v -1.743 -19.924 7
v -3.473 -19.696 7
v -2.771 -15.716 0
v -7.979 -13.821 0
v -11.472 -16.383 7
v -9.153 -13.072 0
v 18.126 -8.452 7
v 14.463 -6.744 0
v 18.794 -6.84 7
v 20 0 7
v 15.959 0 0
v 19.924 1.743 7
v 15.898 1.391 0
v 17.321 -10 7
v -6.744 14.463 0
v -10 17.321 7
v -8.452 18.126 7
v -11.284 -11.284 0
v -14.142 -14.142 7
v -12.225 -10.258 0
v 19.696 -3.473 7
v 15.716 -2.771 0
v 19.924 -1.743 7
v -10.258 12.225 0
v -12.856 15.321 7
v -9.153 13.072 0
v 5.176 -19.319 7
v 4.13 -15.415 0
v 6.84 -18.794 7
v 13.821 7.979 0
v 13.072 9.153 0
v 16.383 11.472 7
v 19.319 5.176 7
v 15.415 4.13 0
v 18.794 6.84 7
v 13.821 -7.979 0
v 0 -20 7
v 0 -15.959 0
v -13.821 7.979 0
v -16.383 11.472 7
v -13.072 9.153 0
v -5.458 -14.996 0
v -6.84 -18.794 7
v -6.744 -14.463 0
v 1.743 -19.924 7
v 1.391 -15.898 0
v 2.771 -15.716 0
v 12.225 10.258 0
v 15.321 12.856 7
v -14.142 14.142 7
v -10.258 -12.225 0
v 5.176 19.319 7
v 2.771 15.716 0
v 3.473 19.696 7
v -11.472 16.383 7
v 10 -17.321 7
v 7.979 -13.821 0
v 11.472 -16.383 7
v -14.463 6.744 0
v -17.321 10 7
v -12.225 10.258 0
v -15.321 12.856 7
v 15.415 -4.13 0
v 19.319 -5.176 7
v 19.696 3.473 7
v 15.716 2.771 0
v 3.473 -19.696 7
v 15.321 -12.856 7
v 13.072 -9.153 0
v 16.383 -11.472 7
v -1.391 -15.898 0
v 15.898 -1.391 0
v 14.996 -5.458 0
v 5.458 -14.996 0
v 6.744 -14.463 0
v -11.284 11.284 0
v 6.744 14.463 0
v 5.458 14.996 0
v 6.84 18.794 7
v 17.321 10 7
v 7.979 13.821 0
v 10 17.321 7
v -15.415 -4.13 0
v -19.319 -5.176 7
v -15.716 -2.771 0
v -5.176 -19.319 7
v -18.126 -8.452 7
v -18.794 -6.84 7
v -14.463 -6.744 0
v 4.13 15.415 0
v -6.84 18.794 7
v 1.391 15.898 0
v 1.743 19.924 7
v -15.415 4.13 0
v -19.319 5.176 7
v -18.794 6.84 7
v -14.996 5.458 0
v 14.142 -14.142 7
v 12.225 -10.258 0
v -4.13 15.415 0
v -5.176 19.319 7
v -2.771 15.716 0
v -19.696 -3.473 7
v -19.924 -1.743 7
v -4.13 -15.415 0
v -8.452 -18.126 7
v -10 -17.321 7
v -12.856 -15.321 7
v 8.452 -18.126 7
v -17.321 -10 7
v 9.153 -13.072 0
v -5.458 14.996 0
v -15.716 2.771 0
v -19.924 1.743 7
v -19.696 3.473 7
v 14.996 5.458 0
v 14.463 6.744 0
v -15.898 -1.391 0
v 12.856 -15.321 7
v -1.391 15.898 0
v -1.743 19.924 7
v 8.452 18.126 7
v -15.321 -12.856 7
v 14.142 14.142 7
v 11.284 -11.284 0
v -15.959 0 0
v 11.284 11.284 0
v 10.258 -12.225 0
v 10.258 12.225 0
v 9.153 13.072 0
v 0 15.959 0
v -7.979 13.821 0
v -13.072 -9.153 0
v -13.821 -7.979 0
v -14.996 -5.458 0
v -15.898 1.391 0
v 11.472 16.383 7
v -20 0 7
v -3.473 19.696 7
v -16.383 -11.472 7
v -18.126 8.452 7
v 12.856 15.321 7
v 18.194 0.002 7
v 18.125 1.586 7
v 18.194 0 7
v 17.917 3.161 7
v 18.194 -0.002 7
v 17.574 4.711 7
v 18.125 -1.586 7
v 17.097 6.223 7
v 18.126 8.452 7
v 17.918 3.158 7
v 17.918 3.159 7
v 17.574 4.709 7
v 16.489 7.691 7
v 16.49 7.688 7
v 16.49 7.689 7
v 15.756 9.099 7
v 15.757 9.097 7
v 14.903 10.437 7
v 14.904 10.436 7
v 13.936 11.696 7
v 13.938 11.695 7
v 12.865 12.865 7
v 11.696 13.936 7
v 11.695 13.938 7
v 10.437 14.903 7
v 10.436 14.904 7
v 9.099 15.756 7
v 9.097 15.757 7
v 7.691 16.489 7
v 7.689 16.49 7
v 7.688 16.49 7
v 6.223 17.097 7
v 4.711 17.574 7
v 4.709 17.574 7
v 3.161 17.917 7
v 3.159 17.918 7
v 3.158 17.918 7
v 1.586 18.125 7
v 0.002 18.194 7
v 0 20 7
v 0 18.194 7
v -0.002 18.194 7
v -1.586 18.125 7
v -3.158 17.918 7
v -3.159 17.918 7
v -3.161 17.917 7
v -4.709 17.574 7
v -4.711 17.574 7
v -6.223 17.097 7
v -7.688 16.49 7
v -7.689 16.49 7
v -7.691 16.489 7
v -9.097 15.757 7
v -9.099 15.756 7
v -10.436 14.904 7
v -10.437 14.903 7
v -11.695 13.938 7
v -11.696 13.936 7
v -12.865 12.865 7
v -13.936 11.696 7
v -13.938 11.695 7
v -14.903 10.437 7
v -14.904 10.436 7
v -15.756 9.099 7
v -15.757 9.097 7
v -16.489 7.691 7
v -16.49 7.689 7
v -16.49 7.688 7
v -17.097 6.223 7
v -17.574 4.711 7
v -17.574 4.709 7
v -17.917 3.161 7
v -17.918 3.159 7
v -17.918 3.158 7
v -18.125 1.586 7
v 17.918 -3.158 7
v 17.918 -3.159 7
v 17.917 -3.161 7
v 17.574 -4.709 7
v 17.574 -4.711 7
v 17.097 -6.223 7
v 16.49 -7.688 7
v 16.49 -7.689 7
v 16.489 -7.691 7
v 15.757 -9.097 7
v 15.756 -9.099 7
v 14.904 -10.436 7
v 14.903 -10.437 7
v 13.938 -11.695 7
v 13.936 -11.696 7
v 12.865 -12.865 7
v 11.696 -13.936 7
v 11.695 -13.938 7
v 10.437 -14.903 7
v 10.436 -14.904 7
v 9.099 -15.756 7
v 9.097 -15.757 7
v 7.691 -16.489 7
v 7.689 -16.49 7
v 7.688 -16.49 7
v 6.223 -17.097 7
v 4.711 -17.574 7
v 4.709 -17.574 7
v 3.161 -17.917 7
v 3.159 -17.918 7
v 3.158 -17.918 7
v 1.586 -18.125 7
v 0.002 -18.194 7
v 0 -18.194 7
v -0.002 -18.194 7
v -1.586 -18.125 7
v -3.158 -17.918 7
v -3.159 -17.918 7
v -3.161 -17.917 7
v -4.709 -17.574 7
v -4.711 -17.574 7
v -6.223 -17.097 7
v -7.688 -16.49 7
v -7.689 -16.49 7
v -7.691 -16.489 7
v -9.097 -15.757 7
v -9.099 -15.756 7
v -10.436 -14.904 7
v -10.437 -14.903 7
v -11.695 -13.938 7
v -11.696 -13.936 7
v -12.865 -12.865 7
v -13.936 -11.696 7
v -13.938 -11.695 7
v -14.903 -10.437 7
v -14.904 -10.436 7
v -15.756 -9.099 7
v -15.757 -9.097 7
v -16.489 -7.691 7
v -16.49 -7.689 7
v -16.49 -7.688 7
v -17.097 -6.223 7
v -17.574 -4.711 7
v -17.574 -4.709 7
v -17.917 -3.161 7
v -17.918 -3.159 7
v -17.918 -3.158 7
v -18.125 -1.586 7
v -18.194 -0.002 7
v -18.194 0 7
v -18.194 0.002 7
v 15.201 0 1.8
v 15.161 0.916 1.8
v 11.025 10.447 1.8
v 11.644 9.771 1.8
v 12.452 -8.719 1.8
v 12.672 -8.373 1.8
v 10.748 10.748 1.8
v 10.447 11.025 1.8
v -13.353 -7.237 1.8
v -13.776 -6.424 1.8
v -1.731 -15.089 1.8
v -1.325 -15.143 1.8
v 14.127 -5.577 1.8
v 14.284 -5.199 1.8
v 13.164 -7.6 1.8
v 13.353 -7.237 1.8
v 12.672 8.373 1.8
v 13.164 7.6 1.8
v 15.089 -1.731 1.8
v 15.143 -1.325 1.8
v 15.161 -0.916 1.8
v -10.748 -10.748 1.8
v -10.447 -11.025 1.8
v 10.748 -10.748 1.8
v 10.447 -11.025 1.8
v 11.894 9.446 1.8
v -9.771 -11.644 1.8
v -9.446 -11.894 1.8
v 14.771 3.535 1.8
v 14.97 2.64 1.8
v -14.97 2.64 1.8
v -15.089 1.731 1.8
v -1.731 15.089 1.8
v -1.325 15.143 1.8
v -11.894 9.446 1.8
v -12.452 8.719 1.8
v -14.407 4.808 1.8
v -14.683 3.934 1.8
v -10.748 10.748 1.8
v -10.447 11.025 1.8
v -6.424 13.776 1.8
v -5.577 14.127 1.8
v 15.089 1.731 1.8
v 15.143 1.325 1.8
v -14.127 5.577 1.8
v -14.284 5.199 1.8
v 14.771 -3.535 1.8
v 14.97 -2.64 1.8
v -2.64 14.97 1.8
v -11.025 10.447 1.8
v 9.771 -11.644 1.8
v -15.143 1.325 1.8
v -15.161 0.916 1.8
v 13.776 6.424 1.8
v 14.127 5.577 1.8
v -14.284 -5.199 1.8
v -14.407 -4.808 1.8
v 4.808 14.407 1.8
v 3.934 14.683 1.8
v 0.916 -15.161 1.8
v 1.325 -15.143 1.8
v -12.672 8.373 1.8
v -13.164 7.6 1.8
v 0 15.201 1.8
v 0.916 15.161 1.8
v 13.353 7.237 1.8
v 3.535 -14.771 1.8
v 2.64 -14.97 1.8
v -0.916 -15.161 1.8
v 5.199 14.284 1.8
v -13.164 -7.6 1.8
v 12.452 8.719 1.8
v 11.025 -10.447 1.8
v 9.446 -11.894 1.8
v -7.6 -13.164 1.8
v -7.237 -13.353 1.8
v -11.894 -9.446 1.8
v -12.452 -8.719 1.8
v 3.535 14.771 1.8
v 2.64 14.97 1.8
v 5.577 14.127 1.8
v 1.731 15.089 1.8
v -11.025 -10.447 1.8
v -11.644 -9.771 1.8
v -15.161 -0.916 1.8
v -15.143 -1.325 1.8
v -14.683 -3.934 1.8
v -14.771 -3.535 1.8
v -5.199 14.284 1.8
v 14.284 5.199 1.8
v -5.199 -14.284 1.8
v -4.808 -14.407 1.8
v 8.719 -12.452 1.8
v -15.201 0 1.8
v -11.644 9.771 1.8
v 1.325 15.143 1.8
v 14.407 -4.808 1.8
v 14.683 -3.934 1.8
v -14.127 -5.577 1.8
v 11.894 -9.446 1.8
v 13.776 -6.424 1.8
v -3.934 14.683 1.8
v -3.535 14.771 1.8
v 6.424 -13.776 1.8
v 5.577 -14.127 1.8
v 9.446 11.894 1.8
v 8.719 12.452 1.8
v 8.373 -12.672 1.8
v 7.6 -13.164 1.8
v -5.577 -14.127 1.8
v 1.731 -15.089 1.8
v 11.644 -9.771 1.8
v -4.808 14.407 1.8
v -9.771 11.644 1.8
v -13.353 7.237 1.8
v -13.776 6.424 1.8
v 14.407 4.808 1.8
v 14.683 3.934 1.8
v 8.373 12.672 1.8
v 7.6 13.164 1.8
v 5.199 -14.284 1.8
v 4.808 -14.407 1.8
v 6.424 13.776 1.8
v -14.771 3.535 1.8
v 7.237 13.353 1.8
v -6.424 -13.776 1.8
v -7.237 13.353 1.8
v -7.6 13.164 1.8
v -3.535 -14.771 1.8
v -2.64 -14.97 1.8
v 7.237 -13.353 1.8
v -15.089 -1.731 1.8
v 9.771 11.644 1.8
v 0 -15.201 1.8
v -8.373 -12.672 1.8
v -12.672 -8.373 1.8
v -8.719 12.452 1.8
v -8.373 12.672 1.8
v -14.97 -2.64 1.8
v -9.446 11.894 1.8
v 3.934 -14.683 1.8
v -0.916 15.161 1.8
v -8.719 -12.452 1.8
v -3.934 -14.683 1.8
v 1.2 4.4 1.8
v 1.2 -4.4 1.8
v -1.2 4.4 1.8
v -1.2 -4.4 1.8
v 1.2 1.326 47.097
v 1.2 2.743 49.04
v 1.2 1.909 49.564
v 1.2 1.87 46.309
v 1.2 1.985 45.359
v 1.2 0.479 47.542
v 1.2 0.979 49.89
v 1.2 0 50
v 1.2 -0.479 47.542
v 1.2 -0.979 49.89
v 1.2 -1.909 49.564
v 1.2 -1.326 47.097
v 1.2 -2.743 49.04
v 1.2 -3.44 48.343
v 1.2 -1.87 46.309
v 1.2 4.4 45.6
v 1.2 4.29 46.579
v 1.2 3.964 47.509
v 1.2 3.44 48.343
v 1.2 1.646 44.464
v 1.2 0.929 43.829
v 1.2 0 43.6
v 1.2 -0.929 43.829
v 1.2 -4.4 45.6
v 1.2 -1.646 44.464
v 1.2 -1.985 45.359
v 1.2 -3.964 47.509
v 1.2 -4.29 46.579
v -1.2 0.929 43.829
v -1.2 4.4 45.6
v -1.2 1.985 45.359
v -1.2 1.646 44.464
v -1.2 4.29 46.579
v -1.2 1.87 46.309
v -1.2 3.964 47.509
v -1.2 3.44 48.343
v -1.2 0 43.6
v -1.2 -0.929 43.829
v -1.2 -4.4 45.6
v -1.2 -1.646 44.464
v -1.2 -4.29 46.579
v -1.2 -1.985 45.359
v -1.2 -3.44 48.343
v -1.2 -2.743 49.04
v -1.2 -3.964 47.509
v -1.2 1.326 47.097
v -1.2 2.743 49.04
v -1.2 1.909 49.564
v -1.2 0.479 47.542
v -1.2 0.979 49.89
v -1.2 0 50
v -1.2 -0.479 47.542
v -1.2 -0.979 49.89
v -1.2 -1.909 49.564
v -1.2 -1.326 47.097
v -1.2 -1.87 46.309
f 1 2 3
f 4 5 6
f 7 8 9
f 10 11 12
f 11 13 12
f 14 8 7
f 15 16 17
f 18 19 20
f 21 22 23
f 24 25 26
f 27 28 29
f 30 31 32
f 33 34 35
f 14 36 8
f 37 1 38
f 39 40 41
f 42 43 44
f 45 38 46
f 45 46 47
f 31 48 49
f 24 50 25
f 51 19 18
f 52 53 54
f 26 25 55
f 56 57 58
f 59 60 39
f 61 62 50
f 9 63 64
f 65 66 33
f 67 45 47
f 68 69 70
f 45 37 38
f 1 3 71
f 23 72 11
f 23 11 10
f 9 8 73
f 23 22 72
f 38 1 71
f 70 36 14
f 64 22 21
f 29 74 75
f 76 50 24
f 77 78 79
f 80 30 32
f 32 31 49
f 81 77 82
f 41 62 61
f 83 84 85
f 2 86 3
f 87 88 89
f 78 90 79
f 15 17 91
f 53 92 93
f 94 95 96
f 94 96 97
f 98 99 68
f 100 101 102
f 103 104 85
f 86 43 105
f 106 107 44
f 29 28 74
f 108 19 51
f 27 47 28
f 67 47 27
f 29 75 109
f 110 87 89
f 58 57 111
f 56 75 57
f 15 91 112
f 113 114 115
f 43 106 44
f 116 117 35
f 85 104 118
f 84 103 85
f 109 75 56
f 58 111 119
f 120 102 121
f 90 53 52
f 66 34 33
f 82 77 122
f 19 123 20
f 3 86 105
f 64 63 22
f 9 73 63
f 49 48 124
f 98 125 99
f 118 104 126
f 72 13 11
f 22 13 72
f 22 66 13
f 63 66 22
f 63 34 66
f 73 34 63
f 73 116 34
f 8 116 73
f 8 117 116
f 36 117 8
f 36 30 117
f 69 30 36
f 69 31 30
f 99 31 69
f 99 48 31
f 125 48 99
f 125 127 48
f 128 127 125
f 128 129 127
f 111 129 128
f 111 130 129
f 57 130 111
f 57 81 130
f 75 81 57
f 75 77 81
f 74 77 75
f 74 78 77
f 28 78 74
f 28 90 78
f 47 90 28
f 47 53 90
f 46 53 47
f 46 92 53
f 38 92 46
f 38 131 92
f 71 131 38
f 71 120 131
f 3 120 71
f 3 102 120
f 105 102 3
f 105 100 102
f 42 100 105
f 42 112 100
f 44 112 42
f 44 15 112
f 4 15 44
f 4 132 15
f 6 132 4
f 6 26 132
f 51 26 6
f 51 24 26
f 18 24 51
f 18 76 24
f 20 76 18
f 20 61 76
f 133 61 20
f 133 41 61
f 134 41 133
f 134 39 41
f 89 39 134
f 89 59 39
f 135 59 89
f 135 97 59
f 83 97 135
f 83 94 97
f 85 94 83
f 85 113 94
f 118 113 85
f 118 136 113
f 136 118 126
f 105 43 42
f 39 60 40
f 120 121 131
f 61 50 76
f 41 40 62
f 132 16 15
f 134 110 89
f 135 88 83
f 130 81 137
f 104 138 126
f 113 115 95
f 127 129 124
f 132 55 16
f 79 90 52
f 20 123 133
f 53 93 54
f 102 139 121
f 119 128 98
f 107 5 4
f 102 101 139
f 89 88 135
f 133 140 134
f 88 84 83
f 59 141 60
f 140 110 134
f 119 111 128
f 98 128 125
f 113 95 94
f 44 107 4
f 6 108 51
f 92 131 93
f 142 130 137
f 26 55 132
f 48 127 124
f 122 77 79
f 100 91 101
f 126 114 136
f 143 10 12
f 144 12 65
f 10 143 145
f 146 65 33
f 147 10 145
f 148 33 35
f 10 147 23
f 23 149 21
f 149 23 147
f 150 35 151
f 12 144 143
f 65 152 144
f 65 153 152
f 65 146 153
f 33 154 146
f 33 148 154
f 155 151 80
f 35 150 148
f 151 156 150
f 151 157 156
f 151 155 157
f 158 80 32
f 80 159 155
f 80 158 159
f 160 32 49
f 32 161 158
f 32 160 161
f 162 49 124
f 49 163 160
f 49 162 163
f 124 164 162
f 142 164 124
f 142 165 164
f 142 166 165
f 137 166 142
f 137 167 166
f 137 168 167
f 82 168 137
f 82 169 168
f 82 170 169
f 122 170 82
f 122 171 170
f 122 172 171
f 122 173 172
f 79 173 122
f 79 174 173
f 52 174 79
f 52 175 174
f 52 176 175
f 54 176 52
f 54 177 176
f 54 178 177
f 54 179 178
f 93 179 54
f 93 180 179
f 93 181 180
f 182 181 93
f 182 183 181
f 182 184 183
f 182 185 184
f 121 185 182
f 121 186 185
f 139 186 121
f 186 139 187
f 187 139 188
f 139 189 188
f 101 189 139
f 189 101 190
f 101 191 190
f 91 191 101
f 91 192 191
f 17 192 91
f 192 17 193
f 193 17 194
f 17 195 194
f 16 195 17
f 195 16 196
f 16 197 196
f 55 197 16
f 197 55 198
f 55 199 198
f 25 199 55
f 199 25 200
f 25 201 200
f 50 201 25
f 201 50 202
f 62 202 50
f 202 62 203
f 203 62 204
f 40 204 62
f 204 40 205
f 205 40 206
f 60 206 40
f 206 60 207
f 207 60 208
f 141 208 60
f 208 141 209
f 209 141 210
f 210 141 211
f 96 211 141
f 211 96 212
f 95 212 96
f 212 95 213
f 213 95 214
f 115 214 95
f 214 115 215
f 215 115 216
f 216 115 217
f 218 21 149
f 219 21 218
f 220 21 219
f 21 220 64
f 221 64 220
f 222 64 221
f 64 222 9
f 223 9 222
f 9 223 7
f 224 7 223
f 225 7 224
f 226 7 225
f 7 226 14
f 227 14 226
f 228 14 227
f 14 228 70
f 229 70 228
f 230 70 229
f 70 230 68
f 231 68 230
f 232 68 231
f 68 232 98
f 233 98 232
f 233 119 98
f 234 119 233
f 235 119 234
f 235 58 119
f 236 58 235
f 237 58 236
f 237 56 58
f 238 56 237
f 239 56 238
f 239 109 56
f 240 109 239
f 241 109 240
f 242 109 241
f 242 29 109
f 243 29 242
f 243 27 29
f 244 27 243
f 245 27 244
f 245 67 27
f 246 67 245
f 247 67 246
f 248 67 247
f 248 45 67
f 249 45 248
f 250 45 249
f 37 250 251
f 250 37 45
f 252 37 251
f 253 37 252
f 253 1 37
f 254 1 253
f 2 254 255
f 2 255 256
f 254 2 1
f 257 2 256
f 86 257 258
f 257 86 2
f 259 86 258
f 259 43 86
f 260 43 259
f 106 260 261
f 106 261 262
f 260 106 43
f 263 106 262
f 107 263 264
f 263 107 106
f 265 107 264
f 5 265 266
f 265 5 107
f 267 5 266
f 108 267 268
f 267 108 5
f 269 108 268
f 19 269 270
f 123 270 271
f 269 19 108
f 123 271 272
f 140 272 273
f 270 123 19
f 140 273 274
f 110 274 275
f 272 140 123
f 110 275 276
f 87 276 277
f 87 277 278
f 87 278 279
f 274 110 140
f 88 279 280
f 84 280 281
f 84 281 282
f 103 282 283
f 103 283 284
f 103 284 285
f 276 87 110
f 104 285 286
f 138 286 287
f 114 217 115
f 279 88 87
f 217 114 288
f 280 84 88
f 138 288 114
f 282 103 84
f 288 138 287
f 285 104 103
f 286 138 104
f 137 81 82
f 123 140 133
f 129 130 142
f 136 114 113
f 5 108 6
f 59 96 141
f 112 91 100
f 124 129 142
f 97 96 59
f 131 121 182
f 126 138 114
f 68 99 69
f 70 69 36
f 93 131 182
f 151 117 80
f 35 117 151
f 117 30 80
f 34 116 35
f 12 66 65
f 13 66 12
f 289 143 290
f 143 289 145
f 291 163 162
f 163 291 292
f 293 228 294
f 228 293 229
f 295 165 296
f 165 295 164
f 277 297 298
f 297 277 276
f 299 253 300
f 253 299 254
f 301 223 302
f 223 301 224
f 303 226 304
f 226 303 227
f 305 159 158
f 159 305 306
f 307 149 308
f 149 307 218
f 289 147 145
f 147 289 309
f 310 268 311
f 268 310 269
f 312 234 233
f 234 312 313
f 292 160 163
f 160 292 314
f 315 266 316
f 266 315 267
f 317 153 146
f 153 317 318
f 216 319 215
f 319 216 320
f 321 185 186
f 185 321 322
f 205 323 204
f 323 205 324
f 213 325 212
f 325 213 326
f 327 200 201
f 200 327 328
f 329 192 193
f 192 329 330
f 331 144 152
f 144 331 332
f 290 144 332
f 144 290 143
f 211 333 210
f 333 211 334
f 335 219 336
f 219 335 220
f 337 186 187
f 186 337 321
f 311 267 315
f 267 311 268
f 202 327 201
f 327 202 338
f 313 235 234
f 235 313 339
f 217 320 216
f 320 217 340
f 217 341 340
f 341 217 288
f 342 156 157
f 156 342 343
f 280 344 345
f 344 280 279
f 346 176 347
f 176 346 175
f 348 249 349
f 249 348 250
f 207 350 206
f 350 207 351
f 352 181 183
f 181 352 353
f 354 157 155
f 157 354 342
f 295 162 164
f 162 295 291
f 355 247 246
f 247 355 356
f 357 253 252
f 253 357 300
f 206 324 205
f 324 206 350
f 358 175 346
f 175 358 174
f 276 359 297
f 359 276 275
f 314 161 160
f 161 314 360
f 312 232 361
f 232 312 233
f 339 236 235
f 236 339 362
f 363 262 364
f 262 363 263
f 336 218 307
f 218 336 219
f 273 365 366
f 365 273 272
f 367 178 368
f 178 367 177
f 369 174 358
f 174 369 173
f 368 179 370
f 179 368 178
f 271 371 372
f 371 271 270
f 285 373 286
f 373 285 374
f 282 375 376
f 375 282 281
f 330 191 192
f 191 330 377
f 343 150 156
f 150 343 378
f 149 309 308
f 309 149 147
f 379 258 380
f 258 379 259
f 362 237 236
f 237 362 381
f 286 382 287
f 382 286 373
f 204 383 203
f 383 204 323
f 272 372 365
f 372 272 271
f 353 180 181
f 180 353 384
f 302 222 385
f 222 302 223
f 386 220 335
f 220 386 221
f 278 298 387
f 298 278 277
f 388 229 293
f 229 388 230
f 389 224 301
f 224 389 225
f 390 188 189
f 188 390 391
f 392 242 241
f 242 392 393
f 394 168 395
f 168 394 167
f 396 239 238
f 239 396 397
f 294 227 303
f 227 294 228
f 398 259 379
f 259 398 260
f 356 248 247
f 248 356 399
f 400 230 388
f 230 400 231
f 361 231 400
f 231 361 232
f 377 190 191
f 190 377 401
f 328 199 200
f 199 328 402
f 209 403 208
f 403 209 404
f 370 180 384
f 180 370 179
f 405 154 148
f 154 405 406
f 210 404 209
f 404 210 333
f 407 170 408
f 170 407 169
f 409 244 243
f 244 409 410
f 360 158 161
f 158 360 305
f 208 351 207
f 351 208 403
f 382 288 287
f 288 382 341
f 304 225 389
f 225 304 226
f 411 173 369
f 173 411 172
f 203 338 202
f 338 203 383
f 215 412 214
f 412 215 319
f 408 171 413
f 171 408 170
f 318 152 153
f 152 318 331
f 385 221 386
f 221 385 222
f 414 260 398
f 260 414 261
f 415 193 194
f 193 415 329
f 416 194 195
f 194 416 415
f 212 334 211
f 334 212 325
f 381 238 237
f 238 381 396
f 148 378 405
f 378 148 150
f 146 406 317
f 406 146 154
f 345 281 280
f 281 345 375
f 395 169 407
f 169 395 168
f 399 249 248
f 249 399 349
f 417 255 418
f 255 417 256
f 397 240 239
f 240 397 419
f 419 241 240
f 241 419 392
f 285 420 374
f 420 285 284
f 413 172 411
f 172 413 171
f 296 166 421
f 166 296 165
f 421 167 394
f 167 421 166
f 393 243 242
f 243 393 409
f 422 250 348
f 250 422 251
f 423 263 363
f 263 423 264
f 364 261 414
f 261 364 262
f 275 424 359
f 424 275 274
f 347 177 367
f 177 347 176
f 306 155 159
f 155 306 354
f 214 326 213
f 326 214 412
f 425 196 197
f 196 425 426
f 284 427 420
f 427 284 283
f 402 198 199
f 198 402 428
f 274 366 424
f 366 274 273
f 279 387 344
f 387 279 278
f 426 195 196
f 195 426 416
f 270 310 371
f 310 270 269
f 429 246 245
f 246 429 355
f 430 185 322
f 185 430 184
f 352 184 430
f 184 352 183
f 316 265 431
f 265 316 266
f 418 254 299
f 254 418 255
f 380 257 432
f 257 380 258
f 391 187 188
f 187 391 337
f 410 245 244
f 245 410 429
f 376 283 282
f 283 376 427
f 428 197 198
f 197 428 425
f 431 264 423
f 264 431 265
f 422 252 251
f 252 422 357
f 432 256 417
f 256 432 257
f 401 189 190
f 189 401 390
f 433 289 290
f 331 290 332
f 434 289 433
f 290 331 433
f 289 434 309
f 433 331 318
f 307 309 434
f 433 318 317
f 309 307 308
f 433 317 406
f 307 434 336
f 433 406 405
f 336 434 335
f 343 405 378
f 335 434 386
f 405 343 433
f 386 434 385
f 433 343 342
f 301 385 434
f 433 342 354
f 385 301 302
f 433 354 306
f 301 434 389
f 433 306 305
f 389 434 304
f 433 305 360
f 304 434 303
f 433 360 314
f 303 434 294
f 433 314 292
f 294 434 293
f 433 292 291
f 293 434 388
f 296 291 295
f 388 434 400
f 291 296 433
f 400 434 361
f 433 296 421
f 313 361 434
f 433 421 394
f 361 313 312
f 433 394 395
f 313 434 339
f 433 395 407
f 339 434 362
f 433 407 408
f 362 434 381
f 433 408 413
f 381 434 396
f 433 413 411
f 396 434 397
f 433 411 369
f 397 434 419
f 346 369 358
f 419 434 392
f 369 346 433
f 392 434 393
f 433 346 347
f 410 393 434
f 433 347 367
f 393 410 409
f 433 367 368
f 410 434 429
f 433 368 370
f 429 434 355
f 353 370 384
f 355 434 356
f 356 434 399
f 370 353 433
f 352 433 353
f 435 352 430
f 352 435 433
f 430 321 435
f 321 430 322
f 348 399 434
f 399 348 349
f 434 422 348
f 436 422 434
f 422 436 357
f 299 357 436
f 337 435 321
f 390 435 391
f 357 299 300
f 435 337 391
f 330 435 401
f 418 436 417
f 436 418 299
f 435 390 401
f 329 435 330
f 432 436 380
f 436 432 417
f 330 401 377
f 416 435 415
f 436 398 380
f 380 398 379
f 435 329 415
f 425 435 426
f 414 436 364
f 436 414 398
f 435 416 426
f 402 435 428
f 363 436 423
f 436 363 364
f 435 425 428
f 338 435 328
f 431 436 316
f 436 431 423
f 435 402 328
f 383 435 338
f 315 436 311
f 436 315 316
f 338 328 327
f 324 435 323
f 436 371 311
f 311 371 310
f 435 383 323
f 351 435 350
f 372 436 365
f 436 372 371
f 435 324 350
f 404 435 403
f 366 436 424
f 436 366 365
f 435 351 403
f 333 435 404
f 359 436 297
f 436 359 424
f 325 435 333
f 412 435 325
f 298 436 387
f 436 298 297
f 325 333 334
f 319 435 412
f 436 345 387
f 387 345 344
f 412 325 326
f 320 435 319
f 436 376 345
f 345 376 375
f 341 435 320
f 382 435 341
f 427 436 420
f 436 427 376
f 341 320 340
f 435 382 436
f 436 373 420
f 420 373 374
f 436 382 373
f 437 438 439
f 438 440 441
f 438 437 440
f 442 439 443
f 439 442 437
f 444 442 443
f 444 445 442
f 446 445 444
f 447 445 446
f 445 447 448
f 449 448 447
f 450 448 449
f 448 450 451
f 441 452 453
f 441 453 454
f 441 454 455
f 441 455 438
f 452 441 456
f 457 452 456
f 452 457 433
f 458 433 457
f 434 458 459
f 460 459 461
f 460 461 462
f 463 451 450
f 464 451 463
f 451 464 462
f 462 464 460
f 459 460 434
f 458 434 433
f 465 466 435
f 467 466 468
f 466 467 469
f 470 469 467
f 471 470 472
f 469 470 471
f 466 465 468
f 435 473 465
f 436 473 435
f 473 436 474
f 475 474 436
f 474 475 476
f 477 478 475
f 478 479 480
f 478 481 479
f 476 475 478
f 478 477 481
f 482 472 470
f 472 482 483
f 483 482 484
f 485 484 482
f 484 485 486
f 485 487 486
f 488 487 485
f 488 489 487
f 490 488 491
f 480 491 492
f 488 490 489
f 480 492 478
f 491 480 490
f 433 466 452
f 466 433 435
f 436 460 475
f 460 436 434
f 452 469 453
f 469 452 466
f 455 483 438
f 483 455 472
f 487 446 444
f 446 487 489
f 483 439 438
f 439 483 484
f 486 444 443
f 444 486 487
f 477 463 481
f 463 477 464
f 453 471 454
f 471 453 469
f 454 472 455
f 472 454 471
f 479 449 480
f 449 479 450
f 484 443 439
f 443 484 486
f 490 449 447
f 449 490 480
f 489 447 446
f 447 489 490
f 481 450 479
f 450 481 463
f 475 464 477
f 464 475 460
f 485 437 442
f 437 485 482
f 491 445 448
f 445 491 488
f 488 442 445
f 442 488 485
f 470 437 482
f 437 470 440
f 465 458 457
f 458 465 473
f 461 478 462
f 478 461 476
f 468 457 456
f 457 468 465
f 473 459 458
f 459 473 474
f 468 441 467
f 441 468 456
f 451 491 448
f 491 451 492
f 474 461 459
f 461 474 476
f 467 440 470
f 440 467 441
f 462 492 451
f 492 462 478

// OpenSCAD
// -*- mode: SCAD ; c-file-style: "ellemtel" ; coding: utf-8 -*-
//
// simple, functional small mushroom anchor
//
// © 2018 Roland Sieker <ospalh@gmail.com>
// Licence: CC-BY-SA 4.0

// Radius of the cap in millimetres
r = 20;  // [5:1:50]

// size of the “chain” hole
hl = 4;  // [1:0.5:10]

// Set this to “render” and click on “Create Thing” when done with the setup.
preview = 1; // [0:render, 1:preview]



/* [Hidden] */

// Done with the customizer

// *******************************************************
// Extra parameters. These can be changed reasonably safely.

l_to_r = 2.5;  // Length of the stem in rs
r_to_h = 0.35;

w = 2.4;  // Wall width
p = 1.8; // cap width
c = 0.4;  // Clearance
angle = 60; // Overhangs much below 60° are a problem for me

// *******************************************************
// Some shortcuts. These shouldn’t be changed

tau = 2 * PI;  // π is still wrong. τ = circumference ÷ r

xy_factor = 1/tan(angle);
// To get from a height to a horizontal width inclined correctly
z_factor = tan(angle);  // The other way around


h = r * r_to_h;
r_i = r - h * xy_factor;
l = r * l_to_r;


some_distance = 50;
ms = 0.01;  // Muggeseggele.

// fn for differently sized objects and fs, fa; all for preview or rendering.
pna = 40;
pnb = 15;
pa = 5;
ps = 1;
rna = 180;
rnb = 30;
ra = 1;
rs = 0.1;
function na() = (preview) ? pna : rna;
function nb() = (preview) ? pnb : rnb;
$fs = (preview) ? ps : rs;
$fa = (preview) ? pa : ra;

// *******************************************************
// End setup



// *******************************************************
// Generate the part

mushroom_anchor();



// *******************************************************
// Code for the parts themselves

module mushroom_anchor()
{
   anchor_cap();
   anchor_stem();
}

module anchor_cap()
{
   difference()
   {
      cylinder(r1=r_i, r2=r, h=h);
      translate([0, 0, -ms])
      {
         cylinder(r1=r_i-p, r2=r-p, h=h+2*ms);
      }
   }
   cylinder(r=r_i, h=p);
}

module anchor_stem()
{
   le = l - w  - hl/2;
   difference()
   {
      union()
      {
         translate([0,0,le/2])
         {
            cube([w,2*w+hl,le], center=true);
         }

         translate([0, 0, le])
         {
            rotate([0, 90, 0])
            {
               cylinder(r=w+hl/2, h=w, center=true);
            }
         }
      }
      translate([0, 0, le])
      {
         rotate([0, 90, 0])
         {
            cylinder(r=hl/2, h=w+2*ms, center=true);
         }
      }
   }
}
